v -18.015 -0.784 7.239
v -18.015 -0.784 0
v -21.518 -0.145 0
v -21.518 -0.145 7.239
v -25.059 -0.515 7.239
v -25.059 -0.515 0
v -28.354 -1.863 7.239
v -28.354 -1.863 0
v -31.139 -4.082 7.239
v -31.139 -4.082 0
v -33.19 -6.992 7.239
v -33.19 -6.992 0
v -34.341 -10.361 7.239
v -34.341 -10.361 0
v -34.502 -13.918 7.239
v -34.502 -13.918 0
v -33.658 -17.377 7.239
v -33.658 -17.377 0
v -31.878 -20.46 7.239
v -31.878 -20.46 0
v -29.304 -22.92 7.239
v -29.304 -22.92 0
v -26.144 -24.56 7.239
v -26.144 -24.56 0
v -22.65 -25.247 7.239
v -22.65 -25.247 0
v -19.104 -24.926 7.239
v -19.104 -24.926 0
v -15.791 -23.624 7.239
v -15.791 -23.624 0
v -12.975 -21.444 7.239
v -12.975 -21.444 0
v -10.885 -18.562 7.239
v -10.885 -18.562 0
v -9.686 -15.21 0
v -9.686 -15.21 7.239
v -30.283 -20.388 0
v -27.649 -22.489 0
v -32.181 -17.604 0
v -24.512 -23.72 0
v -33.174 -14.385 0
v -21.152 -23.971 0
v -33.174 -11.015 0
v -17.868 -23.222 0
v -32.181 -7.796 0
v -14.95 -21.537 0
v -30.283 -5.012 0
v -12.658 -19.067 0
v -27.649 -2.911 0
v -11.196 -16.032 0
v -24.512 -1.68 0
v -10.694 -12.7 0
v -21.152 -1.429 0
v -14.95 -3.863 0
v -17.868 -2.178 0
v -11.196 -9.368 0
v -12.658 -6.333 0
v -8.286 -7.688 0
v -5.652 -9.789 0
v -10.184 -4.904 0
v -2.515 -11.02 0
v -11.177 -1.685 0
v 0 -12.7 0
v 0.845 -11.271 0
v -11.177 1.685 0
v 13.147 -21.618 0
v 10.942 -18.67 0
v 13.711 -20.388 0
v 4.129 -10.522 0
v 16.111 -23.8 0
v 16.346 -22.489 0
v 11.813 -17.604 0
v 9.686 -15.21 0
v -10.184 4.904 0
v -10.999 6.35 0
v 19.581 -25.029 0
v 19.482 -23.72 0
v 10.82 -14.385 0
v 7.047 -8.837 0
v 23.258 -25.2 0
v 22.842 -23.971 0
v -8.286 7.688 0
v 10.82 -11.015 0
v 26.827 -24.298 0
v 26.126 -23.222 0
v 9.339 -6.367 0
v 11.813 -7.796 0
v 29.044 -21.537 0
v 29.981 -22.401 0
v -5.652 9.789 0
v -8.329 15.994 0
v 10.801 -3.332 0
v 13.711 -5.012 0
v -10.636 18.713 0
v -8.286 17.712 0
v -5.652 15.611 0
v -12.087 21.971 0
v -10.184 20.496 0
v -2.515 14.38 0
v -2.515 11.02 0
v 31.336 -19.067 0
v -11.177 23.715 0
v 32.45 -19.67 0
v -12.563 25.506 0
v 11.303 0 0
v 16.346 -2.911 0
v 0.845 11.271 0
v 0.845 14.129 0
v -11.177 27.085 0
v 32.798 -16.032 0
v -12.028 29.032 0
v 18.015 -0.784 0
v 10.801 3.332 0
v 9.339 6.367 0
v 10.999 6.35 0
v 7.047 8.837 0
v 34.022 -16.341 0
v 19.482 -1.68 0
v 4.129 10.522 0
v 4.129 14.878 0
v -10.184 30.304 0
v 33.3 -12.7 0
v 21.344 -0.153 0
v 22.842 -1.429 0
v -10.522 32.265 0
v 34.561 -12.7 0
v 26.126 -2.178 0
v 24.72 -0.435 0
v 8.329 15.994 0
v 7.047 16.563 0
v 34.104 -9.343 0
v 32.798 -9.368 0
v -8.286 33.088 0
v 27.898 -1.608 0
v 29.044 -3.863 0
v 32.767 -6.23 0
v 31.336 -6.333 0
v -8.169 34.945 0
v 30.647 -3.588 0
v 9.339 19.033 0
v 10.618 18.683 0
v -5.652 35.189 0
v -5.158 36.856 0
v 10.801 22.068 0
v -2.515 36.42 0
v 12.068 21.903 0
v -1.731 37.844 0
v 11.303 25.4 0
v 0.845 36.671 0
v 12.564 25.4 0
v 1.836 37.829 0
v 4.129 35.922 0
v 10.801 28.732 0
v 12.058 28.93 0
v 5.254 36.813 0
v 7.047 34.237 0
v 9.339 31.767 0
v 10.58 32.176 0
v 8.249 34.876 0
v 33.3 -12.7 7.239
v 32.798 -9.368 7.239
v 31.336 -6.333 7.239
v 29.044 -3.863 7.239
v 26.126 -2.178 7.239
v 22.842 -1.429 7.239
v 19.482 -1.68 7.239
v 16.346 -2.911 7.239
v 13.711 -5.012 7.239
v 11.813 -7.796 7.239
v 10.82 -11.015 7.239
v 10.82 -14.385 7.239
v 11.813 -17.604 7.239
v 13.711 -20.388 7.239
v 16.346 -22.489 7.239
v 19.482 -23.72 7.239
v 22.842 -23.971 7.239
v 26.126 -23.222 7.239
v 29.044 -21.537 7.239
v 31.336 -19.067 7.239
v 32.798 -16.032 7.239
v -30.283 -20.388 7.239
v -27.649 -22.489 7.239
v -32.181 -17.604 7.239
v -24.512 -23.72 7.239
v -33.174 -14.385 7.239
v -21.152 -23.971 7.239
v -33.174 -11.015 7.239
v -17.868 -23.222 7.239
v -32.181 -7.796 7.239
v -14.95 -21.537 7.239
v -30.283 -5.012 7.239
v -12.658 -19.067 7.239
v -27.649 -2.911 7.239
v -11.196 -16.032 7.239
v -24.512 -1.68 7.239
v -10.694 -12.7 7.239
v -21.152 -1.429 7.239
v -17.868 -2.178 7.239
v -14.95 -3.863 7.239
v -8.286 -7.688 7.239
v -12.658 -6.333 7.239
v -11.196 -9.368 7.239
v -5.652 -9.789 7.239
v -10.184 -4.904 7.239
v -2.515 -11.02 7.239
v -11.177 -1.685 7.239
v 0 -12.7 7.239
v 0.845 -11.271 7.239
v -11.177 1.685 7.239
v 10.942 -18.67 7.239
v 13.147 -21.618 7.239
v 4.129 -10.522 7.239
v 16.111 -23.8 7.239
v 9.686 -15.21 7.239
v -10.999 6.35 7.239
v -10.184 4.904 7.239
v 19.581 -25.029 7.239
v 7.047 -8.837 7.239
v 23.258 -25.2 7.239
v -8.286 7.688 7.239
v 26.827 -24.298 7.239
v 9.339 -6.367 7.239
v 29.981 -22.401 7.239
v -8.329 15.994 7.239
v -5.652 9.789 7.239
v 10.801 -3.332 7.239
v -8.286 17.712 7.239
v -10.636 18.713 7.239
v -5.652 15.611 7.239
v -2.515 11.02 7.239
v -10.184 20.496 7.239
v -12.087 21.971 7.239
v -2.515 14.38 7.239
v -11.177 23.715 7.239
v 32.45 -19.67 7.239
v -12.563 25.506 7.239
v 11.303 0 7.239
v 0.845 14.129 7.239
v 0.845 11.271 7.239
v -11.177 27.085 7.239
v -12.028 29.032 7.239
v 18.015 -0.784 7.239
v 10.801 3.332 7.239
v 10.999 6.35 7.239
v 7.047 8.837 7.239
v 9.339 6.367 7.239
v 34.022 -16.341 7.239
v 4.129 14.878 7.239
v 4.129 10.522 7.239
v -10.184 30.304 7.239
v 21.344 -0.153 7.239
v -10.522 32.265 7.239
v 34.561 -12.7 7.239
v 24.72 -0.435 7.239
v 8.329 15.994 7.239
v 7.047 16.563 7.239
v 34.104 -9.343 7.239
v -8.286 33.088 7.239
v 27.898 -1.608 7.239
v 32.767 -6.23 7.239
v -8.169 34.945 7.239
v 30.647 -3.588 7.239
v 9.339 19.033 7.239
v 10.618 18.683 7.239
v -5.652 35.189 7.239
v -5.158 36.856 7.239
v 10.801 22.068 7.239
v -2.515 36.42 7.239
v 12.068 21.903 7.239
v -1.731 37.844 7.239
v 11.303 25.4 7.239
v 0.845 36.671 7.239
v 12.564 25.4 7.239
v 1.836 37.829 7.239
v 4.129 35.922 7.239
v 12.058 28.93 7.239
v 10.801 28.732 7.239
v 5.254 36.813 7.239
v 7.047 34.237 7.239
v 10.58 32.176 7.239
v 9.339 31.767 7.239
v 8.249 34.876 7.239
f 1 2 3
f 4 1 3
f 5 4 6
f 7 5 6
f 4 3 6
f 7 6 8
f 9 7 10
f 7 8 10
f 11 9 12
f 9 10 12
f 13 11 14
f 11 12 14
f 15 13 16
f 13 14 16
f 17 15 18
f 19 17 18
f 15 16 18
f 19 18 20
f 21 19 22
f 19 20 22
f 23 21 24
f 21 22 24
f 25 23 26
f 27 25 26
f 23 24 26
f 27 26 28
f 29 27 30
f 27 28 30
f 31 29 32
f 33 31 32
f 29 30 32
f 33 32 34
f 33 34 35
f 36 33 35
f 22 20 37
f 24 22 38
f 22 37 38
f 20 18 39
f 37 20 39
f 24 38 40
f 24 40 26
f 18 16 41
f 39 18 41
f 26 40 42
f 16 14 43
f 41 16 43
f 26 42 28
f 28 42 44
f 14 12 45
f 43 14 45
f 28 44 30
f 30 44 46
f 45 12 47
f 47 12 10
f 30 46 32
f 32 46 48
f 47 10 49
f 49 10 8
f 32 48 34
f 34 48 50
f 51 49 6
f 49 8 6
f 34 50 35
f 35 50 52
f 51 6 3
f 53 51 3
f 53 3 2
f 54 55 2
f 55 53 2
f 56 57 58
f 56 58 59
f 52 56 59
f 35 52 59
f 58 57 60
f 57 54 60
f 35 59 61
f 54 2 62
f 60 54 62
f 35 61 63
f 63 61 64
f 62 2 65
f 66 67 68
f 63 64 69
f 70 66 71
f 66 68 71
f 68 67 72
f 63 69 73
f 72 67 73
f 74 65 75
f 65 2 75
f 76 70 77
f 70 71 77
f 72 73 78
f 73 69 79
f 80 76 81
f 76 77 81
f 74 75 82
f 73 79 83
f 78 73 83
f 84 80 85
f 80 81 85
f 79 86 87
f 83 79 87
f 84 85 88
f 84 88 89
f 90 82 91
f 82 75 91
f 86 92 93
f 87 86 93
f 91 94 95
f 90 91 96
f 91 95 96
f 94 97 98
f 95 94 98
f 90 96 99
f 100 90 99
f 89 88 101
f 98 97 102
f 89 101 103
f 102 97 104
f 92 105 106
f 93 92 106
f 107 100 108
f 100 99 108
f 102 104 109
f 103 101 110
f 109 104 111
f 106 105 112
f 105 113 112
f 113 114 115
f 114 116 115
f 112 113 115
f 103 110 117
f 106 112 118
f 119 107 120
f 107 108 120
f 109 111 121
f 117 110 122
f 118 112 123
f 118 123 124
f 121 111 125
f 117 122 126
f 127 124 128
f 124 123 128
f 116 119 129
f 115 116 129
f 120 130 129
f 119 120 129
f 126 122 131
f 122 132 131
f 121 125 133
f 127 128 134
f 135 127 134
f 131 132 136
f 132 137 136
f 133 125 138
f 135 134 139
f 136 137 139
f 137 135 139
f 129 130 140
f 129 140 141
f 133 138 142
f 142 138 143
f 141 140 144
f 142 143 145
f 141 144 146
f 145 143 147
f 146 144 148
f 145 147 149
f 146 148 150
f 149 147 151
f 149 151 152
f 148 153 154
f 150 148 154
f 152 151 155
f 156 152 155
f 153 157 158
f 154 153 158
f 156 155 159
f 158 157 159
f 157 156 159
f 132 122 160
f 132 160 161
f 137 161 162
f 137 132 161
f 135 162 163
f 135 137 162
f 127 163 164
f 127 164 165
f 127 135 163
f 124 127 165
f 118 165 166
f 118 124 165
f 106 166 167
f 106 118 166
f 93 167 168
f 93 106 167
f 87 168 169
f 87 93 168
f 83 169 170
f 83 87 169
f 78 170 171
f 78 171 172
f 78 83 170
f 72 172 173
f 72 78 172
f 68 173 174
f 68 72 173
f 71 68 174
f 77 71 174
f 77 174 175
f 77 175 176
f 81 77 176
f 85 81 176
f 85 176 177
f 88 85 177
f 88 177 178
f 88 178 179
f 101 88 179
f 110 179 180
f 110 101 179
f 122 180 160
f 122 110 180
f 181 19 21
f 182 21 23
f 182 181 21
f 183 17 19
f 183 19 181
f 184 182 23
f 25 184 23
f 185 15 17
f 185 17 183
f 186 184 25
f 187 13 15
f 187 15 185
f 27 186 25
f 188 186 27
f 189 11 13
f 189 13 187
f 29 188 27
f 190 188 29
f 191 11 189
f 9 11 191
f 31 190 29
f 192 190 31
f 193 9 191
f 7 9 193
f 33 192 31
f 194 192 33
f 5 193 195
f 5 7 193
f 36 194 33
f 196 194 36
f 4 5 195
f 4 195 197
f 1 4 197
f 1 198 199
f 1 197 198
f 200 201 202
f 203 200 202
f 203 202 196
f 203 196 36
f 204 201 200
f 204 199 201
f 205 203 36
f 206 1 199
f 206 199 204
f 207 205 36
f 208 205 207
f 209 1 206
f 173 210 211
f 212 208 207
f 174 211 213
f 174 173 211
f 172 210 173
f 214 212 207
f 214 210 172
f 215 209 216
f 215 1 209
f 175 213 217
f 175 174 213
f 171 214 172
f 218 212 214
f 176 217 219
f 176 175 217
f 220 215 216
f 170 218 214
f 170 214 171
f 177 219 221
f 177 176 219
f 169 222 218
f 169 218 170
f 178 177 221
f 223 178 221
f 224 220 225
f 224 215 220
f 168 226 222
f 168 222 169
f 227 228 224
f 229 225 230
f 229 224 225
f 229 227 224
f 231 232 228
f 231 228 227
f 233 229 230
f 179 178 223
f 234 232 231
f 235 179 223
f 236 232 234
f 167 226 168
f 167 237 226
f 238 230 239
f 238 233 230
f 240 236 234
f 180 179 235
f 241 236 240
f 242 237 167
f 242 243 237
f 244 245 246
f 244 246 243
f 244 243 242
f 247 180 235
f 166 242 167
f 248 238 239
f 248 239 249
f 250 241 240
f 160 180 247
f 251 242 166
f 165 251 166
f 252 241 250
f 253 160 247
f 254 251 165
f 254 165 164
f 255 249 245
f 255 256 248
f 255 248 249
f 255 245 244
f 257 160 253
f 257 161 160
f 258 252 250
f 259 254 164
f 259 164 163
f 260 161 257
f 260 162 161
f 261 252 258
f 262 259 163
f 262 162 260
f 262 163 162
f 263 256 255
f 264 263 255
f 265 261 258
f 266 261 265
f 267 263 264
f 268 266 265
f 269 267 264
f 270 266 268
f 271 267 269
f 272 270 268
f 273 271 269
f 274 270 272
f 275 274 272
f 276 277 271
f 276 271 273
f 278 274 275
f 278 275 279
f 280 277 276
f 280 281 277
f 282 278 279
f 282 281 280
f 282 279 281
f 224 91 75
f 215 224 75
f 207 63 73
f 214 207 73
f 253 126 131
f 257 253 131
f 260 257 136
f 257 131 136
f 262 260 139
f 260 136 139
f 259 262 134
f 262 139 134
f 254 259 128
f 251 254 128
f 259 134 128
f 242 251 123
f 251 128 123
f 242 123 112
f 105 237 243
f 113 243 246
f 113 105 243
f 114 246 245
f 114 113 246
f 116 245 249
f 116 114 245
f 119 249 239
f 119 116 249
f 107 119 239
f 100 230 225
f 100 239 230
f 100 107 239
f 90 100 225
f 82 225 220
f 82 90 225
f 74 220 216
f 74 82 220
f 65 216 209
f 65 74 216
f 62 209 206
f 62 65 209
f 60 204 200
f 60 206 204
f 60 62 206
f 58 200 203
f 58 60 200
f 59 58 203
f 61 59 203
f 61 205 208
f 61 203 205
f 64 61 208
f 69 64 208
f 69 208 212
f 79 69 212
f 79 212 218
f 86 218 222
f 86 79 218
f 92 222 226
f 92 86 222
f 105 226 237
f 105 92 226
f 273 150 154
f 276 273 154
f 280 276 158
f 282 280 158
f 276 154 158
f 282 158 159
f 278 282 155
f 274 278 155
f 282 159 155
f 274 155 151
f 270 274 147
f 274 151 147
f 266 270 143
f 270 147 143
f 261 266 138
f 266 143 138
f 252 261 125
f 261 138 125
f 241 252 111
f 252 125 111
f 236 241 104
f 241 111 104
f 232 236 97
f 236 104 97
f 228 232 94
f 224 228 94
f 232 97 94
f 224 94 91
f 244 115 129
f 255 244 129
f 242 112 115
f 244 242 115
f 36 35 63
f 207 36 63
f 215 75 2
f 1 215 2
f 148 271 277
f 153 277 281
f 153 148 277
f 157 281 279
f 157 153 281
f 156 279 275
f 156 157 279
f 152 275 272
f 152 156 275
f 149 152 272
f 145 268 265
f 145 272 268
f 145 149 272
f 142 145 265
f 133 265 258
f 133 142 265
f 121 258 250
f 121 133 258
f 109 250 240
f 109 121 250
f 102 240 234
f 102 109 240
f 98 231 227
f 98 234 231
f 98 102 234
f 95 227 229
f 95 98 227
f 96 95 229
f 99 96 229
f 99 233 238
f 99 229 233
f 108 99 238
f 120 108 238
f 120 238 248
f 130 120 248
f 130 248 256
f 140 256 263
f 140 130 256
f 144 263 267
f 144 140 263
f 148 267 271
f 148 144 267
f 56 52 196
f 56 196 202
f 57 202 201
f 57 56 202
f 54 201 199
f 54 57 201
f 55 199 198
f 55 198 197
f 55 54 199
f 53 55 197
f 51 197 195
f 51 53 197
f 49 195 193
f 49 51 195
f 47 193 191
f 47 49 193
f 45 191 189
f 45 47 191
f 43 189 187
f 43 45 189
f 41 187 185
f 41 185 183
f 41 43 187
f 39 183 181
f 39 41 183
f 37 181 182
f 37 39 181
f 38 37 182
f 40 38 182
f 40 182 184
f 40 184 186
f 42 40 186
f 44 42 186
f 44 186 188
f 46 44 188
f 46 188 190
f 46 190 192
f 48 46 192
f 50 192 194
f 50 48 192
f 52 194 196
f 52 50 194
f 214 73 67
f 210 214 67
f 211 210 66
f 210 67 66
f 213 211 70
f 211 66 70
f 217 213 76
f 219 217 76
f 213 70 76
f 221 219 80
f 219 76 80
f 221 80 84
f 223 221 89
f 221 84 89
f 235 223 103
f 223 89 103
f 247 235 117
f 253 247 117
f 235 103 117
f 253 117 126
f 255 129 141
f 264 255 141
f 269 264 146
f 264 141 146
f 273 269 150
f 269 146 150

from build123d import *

# Parameters (mm, degrees)
F0_R     = 11.303
F1_DEPTH = 7.239
F2_DEPTH = 25.4


with BuildPart() as f1:
    # F0 (on Top) → F1 (new body)
    with BuildSketch(Plane.XY):
        with BuildLine():
            ThreePointArc((-8.328858, 15.993502), (0, 12.83608), (8.328858, 15.993502))
            ThreePointArc((8.328858, 15.993502), (11.456334, 20.242046), (12.56392, 25.4))
            ThreePointArc((12.56392, 25.4), (-5.157954, 36.856334), (-8.328858, 15.993502))
        make_face()
        with Locations((0, 25.4)):
            Circle(F0_R, mode=Mode.SUBTRACT)
        with Locations((0, 25.4)):
            Circle(F0_R)
        with BuildLine():
            ThreePointArc((10.998523, 6.35), (12.267258, 3.287002), (12.7, 0))
            ThreePointArc((12.7, 0), (8.980256, -8.980256), (0, -12.7))
            Line((0, -12.7), (9.68635, -15.209754))
            ThreePointArc((9.68635, -15.209754), (11.116371, -6.41804), (18.015208, -0.783748))
            Line((18.015208, -0.783748), (10.998523, 6.35))
        make_face()
        with BuildLine():
            ThreePointArc((-10.998523, 6.35), (0, 12.7), (10.998523, 6.35))
            Line((10.998523, 6.35), (8.328858, 15.993502))
            ThreePointArc((8.328858, 15.993502), (0, 12.83608), (-8.328858, 15.993502))
            Line((-8.328858, 15.993502), (-10.998523, 6.35))
        make_face()
        with Locations((-21.997045, -12.7)):
            Circle(F0_R)
        with Locations((21.997045, -12.7)):
            Circle(F0_R)
        with BuildLine():
            ThreePointArc((0, -12.7), (8.980256, -8.980256), (12.7, 0))
            ThreePointArc((12.7, 0), (12.267258, 3.287002), (10.998523, 6.35))
            ThreePointArc((10.998523, 6.35), (0, 12.7), (-10.998523, 6.35))
            ThreePointArc((-10.998523, 6.35), (-10.998523, -6.35), (0, -12.7))
        make_face()
        Circle(F0_R, mode=Mode.SUBTRACT)
        Circle(F0_R)
        with BuildLine():
            ThreePointArc((34.560965, -12.7), (29.339545, -2.504914), (18.015208, -0.783748))
            ThreePointArc((18.015208, -0.783748), (11.116371, -6.41804), (9.68635, -15.209754))
            ThreePointArc((9.68635, -15.209754), (23.258293, -25.200453), (34.560965, -12.7))
        make_face()
        with Locations((21.997045, -12.7)):
            Circle(F0_R, mode=Mode.SUBTRACT)
        with BuildLine():
            ThreePointArc((-18.015208, -0.783748), (-32.877719, -18.98196), (-9.68635, -15.209754))
            ThreePointArc((-9.68635, -15.209754), (-9.496592, -13.961248), (-9.433125, -12.7))
            ThreePointArc((-9.433125, -12.7), (-11.801959, -5.3575), (-18.015208, -0.783748))
        make_face()
        with Locations((-21.997045, -12.7)):
            Circle(F0_R, mode=Mode.SUBTRACT)
        with BuildLine():
            Line((-9.68635, -15.209754), (0, -12.7))
            ThreePointArc((0, -12.7), (-10.998523, -6.35), (-10.998523, 6.35))
            Line((-10.998523, 6.35), (-18.015208, -0.783748))
            ThreePointArc((-18.015208, -0.783748), (-11.801959, -5.3575), (-9.433125, -12.7))
            ThreePointArc((-9.433125, -12.7), (-9.496592, -13.961248), (-9.68635, -15.209754))
        make_face()
    extrude(amount=F1_DEPTH)

    # F0 (on Top) → F2 (cut)
    with BuildSketch(Plane.XY):
        with Locations((21.997045, -12.7)):
            Circle(F0_R)
        Circle(F0_R)
        with Locations((0, 25.4)):
            Circle(F0_R)
        with Locations((-21.997045, -12.7)):
            Circle(F0_R)
    extrude(amount=F2_DEPTH, mode=Mode.SUBTRACT)


solid = f1.part
